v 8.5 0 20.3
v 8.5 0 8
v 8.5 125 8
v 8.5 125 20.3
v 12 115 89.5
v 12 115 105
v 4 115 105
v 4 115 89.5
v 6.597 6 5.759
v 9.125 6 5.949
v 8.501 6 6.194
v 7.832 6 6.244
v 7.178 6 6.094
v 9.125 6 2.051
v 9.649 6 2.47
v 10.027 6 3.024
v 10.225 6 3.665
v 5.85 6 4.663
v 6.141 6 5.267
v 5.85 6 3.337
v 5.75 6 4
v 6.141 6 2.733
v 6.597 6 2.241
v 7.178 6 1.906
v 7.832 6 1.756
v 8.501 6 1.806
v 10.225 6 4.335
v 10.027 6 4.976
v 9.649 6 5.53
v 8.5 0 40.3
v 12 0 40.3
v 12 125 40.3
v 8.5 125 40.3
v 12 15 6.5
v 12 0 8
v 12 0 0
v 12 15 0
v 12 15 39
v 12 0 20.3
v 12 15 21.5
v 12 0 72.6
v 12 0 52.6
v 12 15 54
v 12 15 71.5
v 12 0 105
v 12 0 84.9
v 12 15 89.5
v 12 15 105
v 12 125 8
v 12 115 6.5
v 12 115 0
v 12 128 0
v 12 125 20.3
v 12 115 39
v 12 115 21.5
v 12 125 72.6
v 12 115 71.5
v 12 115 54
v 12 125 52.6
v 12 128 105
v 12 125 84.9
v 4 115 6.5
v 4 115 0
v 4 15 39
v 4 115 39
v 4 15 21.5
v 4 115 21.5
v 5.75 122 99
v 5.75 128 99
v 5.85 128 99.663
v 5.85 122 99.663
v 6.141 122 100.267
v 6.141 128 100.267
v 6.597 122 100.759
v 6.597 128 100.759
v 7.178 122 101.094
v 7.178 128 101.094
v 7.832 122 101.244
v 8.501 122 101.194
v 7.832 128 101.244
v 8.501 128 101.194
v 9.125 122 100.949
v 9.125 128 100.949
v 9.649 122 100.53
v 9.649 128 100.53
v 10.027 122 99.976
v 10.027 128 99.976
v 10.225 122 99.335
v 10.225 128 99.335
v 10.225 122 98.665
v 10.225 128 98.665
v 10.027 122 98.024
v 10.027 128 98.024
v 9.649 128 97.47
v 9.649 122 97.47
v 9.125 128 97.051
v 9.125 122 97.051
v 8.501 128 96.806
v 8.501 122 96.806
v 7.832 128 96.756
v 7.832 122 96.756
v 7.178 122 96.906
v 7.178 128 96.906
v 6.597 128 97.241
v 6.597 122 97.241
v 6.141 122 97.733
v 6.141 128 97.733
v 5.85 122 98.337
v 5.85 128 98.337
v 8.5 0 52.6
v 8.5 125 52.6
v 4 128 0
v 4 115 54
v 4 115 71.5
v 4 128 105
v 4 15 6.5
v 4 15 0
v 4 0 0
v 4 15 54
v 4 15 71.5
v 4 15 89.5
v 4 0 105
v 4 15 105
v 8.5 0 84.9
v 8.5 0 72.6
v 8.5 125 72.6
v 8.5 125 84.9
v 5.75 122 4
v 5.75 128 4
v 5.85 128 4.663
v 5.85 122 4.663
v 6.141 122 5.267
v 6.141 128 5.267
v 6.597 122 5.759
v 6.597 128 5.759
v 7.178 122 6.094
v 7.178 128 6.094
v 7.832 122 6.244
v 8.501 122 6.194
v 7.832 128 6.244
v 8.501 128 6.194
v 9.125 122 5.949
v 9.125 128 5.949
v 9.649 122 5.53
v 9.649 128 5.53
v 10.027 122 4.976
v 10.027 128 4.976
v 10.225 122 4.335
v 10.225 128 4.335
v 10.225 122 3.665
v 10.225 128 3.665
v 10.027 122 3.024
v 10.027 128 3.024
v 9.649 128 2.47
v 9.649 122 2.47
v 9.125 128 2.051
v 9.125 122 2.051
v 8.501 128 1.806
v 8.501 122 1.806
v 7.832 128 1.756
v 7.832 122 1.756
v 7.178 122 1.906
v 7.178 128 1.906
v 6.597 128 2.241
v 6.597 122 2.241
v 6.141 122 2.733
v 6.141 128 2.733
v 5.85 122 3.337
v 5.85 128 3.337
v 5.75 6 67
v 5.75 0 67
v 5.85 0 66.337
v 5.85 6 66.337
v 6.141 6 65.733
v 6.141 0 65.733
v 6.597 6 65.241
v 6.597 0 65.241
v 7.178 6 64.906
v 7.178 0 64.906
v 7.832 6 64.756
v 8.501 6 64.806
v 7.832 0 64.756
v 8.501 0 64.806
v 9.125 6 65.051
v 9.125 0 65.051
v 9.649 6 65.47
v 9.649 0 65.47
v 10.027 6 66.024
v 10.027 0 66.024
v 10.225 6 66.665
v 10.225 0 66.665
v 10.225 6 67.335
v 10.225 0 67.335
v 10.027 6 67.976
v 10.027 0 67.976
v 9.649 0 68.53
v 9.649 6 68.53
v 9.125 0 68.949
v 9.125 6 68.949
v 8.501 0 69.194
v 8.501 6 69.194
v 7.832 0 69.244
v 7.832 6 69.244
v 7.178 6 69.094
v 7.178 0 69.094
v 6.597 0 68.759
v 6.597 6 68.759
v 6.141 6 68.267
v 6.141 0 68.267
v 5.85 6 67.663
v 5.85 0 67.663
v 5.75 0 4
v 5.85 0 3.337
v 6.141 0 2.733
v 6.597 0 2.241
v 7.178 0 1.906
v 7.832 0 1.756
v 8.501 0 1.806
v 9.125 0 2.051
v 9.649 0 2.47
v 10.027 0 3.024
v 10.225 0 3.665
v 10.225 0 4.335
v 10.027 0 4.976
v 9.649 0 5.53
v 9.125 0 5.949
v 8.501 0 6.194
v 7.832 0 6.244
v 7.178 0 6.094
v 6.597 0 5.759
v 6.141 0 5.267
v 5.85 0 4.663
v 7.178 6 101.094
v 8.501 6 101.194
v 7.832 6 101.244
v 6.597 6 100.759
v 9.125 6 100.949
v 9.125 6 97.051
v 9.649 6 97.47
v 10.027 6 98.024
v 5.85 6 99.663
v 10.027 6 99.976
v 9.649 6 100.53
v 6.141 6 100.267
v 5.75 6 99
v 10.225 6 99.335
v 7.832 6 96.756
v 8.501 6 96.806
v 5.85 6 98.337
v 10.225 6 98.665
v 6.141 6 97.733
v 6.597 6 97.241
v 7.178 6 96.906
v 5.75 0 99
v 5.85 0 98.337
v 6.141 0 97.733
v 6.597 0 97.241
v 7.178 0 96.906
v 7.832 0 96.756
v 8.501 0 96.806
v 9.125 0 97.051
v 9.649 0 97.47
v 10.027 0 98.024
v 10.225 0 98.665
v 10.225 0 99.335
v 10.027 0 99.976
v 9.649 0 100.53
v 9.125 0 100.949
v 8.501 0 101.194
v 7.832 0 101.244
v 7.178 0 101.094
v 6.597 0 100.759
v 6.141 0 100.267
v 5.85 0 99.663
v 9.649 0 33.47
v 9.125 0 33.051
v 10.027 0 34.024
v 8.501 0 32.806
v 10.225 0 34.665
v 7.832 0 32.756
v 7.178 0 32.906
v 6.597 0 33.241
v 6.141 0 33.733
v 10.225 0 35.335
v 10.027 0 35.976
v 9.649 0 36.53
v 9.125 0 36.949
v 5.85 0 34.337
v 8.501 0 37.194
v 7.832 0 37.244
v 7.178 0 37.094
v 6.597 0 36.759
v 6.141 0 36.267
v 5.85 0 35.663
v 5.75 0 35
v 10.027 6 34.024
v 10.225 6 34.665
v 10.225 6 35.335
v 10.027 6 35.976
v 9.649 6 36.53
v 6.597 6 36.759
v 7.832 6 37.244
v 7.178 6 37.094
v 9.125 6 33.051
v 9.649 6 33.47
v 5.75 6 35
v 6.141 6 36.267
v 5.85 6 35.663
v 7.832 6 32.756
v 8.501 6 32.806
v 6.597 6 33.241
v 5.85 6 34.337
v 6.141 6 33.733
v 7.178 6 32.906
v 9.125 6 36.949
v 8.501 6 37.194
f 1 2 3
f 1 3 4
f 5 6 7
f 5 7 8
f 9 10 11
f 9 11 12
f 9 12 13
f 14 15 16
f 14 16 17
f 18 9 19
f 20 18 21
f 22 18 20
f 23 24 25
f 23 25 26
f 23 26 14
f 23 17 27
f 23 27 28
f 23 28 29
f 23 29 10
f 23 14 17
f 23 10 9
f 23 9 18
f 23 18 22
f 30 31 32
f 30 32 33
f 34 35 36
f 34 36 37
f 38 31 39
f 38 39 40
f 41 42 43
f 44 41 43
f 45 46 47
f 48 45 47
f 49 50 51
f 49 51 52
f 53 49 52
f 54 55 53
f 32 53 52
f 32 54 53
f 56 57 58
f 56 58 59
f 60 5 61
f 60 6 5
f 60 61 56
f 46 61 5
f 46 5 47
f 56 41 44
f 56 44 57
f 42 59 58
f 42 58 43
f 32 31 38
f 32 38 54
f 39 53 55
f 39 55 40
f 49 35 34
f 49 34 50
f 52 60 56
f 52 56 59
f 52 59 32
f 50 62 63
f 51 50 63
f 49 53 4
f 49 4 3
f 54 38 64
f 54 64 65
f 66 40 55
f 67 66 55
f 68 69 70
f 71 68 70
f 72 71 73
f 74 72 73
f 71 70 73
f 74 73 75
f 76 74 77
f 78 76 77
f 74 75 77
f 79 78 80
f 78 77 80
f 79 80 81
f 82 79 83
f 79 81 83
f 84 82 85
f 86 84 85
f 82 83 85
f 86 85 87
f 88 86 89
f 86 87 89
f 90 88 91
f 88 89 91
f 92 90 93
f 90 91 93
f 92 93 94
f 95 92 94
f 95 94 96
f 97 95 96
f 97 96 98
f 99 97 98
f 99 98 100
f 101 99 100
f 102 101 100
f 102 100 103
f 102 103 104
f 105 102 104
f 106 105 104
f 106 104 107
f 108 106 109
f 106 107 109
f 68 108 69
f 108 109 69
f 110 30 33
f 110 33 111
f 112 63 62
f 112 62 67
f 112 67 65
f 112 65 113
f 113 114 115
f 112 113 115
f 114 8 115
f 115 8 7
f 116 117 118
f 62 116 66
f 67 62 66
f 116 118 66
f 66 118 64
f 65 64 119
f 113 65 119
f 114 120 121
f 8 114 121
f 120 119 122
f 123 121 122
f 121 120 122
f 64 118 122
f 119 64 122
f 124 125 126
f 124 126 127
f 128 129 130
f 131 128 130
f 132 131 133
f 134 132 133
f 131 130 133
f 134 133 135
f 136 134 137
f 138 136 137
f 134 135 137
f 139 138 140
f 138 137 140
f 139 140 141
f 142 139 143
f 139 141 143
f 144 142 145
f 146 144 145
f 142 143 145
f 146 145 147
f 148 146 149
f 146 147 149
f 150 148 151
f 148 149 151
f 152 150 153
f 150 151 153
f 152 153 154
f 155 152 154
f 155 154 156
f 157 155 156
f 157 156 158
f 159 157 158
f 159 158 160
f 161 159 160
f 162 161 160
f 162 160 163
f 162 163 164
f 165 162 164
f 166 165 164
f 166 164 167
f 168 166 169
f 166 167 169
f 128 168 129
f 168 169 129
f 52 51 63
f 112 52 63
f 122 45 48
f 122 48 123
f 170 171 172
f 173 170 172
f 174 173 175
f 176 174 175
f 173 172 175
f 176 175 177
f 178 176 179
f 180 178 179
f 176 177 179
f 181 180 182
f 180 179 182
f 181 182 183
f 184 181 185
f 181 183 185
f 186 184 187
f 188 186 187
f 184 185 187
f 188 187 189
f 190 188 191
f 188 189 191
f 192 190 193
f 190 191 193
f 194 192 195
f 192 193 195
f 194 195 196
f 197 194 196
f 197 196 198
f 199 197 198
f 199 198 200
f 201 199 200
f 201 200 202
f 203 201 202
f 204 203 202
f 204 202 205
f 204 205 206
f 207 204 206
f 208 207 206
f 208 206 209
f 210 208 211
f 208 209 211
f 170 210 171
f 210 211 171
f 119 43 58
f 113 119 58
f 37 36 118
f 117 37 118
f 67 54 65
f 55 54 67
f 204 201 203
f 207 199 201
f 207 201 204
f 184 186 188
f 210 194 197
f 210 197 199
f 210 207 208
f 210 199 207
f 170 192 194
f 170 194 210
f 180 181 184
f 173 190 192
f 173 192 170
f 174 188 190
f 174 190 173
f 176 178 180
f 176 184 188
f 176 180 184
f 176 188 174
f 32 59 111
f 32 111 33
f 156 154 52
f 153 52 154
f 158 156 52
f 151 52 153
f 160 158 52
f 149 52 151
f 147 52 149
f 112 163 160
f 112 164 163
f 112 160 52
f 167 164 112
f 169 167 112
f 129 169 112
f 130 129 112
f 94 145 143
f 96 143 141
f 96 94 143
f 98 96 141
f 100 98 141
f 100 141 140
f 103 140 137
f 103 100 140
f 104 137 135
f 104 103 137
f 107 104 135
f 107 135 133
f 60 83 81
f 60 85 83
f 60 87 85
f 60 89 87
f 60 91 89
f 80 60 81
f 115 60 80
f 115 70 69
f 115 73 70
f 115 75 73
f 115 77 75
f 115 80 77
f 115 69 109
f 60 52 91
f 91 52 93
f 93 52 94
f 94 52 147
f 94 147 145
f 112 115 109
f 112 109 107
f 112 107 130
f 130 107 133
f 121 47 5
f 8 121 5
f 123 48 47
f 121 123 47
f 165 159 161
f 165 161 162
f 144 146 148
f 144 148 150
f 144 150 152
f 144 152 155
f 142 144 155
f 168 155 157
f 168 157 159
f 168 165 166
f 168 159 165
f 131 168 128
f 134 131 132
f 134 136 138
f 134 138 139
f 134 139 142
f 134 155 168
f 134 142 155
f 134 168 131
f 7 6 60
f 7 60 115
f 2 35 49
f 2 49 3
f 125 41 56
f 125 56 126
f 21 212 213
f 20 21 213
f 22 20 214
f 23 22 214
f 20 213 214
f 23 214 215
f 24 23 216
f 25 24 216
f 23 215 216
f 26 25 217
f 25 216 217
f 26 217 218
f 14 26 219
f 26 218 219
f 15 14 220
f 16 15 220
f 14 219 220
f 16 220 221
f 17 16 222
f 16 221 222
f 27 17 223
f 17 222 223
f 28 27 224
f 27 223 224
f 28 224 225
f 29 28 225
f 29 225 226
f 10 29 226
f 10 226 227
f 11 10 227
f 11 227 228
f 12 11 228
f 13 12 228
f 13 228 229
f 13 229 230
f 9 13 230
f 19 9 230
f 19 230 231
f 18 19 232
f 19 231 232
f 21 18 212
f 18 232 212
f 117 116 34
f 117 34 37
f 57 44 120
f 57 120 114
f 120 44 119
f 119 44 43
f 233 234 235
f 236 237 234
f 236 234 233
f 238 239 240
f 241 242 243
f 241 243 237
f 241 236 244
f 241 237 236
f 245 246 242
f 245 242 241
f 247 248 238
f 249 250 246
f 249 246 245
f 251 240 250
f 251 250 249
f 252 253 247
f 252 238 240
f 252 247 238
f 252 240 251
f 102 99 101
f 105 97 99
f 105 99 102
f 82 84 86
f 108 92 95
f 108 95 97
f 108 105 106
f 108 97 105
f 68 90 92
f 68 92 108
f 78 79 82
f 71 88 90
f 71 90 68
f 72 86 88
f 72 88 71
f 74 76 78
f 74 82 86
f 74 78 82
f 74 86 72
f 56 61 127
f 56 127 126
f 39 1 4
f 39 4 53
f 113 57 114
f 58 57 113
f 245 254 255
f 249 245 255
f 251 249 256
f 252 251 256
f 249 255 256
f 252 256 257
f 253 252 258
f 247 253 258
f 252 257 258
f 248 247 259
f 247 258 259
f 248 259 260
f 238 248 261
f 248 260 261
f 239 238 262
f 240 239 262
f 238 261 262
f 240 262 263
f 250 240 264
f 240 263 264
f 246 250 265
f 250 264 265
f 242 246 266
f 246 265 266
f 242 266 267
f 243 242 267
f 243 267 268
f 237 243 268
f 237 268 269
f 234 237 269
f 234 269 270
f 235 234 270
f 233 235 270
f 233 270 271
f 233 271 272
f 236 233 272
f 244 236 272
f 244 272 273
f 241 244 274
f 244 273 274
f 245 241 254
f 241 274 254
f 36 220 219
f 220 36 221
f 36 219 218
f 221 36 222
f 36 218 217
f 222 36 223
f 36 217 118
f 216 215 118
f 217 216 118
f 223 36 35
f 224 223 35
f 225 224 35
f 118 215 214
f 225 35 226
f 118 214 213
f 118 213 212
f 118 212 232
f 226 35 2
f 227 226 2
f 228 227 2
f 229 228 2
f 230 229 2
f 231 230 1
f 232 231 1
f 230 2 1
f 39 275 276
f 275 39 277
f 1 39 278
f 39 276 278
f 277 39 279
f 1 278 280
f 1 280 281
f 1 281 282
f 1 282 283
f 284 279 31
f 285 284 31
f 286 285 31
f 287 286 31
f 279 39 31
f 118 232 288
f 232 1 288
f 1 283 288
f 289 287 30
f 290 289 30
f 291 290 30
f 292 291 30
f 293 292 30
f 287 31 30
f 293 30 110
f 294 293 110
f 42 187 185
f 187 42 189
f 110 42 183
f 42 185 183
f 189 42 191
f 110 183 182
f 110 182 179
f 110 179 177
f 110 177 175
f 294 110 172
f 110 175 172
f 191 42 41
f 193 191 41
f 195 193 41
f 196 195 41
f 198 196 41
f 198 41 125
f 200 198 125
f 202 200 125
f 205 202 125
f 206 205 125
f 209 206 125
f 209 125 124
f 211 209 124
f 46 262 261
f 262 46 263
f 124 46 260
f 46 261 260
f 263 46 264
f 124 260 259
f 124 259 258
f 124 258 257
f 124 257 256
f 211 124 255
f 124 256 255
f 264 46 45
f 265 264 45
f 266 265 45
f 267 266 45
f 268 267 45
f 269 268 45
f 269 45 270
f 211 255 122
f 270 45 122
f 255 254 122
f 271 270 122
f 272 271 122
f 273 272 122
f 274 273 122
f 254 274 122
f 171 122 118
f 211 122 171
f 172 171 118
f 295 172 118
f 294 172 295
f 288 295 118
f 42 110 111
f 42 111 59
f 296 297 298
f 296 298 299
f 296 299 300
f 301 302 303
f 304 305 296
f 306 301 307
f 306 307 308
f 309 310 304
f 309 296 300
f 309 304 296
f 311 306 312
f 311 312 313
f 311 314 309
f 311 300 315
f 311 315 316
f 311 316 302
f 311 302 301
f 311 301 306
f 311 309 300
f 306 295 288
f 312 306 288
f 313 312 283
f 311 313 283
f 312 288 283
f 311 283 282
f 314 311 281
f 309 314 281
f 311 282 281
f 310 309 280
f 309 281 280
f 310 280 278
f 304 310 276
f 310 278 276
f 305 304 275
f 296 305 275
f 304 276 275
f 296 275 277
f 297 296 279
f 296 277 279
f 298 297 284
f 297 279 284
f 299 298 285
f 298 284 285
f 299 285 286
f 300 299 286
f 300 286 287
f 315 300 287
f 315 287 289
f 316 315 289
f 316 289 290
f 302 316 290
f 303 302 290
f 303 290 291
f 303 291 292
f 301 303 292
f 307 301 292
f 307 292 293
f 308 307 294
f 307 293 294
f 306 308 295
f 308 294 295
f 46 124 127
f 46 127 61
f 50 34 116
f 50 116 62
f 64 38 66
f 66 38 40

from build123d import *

# Parameters (mm, degrees)
SKETCH026_W             = 122
SKETCH026_H             = 105
PAD006_DEPTH            = 128
SKETCH027_W             = 145.939007
SKETCH027_H             = 190.762029
POCKET019_DEPTH         = 105.001
SKETCH028_W             = 17.5
SKETCH028_H             = 100
SKETCH028_W_2           = 25
SKETCH028_W_3           = 22
POCKET020_DEPTH         = 8.001
SKETCH029_W             = 98.54208
SKETCH029_H             = 3
PAD007_DEPTH            = 7
SKETCH030_R             = 2.25
POCKET021_DEPTH         = 6
SKETCH031_R             = 2.25
POCKET022_DEPTH         = 6
BODY006_PLACEMENT_ANGLE = 180


with BuildPart() as part:
    # Sketch026 → Pad006 (new body)
    with BuildSketch(Plane.XZ):
        with Locations((61, 52.5)):
            Rectangle(SKETCH026_W, SKETCH026_H)
        Polygon((8, 5), (113, 5), (113, 8), (117.5, 8), (117.5, 20.3), (113, 20.3), (113, 40.3), (117.5, 40.3), (117.5, 52.6), (113, 52.6), (113, 72.6), (117.5, 72.6), (117.5, 84.9), (113, 84.9), (113, 100), (8, 100), (8, 84.9), (4, 84.9), (4, 72.6), (8, 72.6), (8, 52.6), (4, 52.6), (4, 40.3), (8, 40.3), (8, 20.3), (4, 20.3), (4, 8), (8, 8), align=None, mode=Mode.SUBTRACT)
    extrude(amount=PAD006_DEPTH)

    # Sketch027 (on Face2 of Pad006) → Pocket019 (cut, through all)
    with BuildSketch(Plane(origin=(0, 0, 105), x_dir=(-1, 0, 0), z_dir=(0, 0, 1))):
        with Locations((-41.0304965, 71.0592985)):
            Rectangle(SKETCH027_W, SKETCH027_H)
    extrude(amount=-POCKET019_DEPTH, mode=Mode.SUBTRACT)

    # Sketch028 (on Face11 of Pocket019) → Pocket020 (cut, through all)
    with BuildSketch(Plane(origin=(114, 0, 0), x_dir=(0, 0, -1), z_dir=(-1, 0, 0))):
        with Locations((-62.75, 65)):
            Rectangle(SKETCH028_W, SKETCH028_H)
        with Locations((-30.25, 65)):
            Rectangle(SKETCH028_W, SKETCH028_H)
        with Locations((-102, 65)):
            Rectangle(SKETCH028_W_2, SKETCH028_H)
        with Locations((4.5, 65)):
            Rectangle(SKETCH028_W_3, SKETCH028_H)
    extrude(amount=-POCKET020_DEPTH, mode=Mode.SUBTRACT)

    # Sketch029 (on Face22 of Pocket020) → Pad007 (join)
    with BuildSketch(Plane(origin=(114, 0, 0), x_dir=(0, 0, -1), z_dir=(-1, 0, 0))):
        with Locations((-51.434969, 126.5)):
            Rectangle(SKETCH029_W, SKETCH029_H)
    extrude(amount=-PAD007_DEPTH)

    # Sketch030 (on Face2 of Pad007) → Pocket021 (cut)
    with BuildSketch(Plane(origin=(0, 0, 0), x_dir=(1, 0, 0), z_dir=(0, 1, 0))):
        with Locations((118, -99)):
            Circle(SKETCH030_R)
        with Locations((118, -67)):
            Circle(SKETCH030_R)
        with Locations((118, -35)):
            Circle(SKETCH030_R)
        with Locations((118, -4)):
            Circle(SKETCH030_R)
    extrude(amount=-POCKET021_DEPTH, mode=Mode.SUBTRACT)

    # Sketch031 (on Face39 of Pocket021) → Pocket022 (cut)
    with BuildSketch(Plane.XZ.offset(128)):
        with Locations((118, 99)):
            Circle(SKETCH031_R)
        with Locations((118, 4)):
            Circle(SKETCH031_R)
    extrude(amount=-POCKET022_DEPTH, mode=Mode.SUBTRACT)


with BuildPart() as part_1:
    # Body006 placement: moved
    add(part.part.moved(Location((126, 0, 0))).rotate(Axis((126, 0, 0), (0, 0, -1)), BODY006_PLACEMENT_ANGLE))


solid = part_1.part
